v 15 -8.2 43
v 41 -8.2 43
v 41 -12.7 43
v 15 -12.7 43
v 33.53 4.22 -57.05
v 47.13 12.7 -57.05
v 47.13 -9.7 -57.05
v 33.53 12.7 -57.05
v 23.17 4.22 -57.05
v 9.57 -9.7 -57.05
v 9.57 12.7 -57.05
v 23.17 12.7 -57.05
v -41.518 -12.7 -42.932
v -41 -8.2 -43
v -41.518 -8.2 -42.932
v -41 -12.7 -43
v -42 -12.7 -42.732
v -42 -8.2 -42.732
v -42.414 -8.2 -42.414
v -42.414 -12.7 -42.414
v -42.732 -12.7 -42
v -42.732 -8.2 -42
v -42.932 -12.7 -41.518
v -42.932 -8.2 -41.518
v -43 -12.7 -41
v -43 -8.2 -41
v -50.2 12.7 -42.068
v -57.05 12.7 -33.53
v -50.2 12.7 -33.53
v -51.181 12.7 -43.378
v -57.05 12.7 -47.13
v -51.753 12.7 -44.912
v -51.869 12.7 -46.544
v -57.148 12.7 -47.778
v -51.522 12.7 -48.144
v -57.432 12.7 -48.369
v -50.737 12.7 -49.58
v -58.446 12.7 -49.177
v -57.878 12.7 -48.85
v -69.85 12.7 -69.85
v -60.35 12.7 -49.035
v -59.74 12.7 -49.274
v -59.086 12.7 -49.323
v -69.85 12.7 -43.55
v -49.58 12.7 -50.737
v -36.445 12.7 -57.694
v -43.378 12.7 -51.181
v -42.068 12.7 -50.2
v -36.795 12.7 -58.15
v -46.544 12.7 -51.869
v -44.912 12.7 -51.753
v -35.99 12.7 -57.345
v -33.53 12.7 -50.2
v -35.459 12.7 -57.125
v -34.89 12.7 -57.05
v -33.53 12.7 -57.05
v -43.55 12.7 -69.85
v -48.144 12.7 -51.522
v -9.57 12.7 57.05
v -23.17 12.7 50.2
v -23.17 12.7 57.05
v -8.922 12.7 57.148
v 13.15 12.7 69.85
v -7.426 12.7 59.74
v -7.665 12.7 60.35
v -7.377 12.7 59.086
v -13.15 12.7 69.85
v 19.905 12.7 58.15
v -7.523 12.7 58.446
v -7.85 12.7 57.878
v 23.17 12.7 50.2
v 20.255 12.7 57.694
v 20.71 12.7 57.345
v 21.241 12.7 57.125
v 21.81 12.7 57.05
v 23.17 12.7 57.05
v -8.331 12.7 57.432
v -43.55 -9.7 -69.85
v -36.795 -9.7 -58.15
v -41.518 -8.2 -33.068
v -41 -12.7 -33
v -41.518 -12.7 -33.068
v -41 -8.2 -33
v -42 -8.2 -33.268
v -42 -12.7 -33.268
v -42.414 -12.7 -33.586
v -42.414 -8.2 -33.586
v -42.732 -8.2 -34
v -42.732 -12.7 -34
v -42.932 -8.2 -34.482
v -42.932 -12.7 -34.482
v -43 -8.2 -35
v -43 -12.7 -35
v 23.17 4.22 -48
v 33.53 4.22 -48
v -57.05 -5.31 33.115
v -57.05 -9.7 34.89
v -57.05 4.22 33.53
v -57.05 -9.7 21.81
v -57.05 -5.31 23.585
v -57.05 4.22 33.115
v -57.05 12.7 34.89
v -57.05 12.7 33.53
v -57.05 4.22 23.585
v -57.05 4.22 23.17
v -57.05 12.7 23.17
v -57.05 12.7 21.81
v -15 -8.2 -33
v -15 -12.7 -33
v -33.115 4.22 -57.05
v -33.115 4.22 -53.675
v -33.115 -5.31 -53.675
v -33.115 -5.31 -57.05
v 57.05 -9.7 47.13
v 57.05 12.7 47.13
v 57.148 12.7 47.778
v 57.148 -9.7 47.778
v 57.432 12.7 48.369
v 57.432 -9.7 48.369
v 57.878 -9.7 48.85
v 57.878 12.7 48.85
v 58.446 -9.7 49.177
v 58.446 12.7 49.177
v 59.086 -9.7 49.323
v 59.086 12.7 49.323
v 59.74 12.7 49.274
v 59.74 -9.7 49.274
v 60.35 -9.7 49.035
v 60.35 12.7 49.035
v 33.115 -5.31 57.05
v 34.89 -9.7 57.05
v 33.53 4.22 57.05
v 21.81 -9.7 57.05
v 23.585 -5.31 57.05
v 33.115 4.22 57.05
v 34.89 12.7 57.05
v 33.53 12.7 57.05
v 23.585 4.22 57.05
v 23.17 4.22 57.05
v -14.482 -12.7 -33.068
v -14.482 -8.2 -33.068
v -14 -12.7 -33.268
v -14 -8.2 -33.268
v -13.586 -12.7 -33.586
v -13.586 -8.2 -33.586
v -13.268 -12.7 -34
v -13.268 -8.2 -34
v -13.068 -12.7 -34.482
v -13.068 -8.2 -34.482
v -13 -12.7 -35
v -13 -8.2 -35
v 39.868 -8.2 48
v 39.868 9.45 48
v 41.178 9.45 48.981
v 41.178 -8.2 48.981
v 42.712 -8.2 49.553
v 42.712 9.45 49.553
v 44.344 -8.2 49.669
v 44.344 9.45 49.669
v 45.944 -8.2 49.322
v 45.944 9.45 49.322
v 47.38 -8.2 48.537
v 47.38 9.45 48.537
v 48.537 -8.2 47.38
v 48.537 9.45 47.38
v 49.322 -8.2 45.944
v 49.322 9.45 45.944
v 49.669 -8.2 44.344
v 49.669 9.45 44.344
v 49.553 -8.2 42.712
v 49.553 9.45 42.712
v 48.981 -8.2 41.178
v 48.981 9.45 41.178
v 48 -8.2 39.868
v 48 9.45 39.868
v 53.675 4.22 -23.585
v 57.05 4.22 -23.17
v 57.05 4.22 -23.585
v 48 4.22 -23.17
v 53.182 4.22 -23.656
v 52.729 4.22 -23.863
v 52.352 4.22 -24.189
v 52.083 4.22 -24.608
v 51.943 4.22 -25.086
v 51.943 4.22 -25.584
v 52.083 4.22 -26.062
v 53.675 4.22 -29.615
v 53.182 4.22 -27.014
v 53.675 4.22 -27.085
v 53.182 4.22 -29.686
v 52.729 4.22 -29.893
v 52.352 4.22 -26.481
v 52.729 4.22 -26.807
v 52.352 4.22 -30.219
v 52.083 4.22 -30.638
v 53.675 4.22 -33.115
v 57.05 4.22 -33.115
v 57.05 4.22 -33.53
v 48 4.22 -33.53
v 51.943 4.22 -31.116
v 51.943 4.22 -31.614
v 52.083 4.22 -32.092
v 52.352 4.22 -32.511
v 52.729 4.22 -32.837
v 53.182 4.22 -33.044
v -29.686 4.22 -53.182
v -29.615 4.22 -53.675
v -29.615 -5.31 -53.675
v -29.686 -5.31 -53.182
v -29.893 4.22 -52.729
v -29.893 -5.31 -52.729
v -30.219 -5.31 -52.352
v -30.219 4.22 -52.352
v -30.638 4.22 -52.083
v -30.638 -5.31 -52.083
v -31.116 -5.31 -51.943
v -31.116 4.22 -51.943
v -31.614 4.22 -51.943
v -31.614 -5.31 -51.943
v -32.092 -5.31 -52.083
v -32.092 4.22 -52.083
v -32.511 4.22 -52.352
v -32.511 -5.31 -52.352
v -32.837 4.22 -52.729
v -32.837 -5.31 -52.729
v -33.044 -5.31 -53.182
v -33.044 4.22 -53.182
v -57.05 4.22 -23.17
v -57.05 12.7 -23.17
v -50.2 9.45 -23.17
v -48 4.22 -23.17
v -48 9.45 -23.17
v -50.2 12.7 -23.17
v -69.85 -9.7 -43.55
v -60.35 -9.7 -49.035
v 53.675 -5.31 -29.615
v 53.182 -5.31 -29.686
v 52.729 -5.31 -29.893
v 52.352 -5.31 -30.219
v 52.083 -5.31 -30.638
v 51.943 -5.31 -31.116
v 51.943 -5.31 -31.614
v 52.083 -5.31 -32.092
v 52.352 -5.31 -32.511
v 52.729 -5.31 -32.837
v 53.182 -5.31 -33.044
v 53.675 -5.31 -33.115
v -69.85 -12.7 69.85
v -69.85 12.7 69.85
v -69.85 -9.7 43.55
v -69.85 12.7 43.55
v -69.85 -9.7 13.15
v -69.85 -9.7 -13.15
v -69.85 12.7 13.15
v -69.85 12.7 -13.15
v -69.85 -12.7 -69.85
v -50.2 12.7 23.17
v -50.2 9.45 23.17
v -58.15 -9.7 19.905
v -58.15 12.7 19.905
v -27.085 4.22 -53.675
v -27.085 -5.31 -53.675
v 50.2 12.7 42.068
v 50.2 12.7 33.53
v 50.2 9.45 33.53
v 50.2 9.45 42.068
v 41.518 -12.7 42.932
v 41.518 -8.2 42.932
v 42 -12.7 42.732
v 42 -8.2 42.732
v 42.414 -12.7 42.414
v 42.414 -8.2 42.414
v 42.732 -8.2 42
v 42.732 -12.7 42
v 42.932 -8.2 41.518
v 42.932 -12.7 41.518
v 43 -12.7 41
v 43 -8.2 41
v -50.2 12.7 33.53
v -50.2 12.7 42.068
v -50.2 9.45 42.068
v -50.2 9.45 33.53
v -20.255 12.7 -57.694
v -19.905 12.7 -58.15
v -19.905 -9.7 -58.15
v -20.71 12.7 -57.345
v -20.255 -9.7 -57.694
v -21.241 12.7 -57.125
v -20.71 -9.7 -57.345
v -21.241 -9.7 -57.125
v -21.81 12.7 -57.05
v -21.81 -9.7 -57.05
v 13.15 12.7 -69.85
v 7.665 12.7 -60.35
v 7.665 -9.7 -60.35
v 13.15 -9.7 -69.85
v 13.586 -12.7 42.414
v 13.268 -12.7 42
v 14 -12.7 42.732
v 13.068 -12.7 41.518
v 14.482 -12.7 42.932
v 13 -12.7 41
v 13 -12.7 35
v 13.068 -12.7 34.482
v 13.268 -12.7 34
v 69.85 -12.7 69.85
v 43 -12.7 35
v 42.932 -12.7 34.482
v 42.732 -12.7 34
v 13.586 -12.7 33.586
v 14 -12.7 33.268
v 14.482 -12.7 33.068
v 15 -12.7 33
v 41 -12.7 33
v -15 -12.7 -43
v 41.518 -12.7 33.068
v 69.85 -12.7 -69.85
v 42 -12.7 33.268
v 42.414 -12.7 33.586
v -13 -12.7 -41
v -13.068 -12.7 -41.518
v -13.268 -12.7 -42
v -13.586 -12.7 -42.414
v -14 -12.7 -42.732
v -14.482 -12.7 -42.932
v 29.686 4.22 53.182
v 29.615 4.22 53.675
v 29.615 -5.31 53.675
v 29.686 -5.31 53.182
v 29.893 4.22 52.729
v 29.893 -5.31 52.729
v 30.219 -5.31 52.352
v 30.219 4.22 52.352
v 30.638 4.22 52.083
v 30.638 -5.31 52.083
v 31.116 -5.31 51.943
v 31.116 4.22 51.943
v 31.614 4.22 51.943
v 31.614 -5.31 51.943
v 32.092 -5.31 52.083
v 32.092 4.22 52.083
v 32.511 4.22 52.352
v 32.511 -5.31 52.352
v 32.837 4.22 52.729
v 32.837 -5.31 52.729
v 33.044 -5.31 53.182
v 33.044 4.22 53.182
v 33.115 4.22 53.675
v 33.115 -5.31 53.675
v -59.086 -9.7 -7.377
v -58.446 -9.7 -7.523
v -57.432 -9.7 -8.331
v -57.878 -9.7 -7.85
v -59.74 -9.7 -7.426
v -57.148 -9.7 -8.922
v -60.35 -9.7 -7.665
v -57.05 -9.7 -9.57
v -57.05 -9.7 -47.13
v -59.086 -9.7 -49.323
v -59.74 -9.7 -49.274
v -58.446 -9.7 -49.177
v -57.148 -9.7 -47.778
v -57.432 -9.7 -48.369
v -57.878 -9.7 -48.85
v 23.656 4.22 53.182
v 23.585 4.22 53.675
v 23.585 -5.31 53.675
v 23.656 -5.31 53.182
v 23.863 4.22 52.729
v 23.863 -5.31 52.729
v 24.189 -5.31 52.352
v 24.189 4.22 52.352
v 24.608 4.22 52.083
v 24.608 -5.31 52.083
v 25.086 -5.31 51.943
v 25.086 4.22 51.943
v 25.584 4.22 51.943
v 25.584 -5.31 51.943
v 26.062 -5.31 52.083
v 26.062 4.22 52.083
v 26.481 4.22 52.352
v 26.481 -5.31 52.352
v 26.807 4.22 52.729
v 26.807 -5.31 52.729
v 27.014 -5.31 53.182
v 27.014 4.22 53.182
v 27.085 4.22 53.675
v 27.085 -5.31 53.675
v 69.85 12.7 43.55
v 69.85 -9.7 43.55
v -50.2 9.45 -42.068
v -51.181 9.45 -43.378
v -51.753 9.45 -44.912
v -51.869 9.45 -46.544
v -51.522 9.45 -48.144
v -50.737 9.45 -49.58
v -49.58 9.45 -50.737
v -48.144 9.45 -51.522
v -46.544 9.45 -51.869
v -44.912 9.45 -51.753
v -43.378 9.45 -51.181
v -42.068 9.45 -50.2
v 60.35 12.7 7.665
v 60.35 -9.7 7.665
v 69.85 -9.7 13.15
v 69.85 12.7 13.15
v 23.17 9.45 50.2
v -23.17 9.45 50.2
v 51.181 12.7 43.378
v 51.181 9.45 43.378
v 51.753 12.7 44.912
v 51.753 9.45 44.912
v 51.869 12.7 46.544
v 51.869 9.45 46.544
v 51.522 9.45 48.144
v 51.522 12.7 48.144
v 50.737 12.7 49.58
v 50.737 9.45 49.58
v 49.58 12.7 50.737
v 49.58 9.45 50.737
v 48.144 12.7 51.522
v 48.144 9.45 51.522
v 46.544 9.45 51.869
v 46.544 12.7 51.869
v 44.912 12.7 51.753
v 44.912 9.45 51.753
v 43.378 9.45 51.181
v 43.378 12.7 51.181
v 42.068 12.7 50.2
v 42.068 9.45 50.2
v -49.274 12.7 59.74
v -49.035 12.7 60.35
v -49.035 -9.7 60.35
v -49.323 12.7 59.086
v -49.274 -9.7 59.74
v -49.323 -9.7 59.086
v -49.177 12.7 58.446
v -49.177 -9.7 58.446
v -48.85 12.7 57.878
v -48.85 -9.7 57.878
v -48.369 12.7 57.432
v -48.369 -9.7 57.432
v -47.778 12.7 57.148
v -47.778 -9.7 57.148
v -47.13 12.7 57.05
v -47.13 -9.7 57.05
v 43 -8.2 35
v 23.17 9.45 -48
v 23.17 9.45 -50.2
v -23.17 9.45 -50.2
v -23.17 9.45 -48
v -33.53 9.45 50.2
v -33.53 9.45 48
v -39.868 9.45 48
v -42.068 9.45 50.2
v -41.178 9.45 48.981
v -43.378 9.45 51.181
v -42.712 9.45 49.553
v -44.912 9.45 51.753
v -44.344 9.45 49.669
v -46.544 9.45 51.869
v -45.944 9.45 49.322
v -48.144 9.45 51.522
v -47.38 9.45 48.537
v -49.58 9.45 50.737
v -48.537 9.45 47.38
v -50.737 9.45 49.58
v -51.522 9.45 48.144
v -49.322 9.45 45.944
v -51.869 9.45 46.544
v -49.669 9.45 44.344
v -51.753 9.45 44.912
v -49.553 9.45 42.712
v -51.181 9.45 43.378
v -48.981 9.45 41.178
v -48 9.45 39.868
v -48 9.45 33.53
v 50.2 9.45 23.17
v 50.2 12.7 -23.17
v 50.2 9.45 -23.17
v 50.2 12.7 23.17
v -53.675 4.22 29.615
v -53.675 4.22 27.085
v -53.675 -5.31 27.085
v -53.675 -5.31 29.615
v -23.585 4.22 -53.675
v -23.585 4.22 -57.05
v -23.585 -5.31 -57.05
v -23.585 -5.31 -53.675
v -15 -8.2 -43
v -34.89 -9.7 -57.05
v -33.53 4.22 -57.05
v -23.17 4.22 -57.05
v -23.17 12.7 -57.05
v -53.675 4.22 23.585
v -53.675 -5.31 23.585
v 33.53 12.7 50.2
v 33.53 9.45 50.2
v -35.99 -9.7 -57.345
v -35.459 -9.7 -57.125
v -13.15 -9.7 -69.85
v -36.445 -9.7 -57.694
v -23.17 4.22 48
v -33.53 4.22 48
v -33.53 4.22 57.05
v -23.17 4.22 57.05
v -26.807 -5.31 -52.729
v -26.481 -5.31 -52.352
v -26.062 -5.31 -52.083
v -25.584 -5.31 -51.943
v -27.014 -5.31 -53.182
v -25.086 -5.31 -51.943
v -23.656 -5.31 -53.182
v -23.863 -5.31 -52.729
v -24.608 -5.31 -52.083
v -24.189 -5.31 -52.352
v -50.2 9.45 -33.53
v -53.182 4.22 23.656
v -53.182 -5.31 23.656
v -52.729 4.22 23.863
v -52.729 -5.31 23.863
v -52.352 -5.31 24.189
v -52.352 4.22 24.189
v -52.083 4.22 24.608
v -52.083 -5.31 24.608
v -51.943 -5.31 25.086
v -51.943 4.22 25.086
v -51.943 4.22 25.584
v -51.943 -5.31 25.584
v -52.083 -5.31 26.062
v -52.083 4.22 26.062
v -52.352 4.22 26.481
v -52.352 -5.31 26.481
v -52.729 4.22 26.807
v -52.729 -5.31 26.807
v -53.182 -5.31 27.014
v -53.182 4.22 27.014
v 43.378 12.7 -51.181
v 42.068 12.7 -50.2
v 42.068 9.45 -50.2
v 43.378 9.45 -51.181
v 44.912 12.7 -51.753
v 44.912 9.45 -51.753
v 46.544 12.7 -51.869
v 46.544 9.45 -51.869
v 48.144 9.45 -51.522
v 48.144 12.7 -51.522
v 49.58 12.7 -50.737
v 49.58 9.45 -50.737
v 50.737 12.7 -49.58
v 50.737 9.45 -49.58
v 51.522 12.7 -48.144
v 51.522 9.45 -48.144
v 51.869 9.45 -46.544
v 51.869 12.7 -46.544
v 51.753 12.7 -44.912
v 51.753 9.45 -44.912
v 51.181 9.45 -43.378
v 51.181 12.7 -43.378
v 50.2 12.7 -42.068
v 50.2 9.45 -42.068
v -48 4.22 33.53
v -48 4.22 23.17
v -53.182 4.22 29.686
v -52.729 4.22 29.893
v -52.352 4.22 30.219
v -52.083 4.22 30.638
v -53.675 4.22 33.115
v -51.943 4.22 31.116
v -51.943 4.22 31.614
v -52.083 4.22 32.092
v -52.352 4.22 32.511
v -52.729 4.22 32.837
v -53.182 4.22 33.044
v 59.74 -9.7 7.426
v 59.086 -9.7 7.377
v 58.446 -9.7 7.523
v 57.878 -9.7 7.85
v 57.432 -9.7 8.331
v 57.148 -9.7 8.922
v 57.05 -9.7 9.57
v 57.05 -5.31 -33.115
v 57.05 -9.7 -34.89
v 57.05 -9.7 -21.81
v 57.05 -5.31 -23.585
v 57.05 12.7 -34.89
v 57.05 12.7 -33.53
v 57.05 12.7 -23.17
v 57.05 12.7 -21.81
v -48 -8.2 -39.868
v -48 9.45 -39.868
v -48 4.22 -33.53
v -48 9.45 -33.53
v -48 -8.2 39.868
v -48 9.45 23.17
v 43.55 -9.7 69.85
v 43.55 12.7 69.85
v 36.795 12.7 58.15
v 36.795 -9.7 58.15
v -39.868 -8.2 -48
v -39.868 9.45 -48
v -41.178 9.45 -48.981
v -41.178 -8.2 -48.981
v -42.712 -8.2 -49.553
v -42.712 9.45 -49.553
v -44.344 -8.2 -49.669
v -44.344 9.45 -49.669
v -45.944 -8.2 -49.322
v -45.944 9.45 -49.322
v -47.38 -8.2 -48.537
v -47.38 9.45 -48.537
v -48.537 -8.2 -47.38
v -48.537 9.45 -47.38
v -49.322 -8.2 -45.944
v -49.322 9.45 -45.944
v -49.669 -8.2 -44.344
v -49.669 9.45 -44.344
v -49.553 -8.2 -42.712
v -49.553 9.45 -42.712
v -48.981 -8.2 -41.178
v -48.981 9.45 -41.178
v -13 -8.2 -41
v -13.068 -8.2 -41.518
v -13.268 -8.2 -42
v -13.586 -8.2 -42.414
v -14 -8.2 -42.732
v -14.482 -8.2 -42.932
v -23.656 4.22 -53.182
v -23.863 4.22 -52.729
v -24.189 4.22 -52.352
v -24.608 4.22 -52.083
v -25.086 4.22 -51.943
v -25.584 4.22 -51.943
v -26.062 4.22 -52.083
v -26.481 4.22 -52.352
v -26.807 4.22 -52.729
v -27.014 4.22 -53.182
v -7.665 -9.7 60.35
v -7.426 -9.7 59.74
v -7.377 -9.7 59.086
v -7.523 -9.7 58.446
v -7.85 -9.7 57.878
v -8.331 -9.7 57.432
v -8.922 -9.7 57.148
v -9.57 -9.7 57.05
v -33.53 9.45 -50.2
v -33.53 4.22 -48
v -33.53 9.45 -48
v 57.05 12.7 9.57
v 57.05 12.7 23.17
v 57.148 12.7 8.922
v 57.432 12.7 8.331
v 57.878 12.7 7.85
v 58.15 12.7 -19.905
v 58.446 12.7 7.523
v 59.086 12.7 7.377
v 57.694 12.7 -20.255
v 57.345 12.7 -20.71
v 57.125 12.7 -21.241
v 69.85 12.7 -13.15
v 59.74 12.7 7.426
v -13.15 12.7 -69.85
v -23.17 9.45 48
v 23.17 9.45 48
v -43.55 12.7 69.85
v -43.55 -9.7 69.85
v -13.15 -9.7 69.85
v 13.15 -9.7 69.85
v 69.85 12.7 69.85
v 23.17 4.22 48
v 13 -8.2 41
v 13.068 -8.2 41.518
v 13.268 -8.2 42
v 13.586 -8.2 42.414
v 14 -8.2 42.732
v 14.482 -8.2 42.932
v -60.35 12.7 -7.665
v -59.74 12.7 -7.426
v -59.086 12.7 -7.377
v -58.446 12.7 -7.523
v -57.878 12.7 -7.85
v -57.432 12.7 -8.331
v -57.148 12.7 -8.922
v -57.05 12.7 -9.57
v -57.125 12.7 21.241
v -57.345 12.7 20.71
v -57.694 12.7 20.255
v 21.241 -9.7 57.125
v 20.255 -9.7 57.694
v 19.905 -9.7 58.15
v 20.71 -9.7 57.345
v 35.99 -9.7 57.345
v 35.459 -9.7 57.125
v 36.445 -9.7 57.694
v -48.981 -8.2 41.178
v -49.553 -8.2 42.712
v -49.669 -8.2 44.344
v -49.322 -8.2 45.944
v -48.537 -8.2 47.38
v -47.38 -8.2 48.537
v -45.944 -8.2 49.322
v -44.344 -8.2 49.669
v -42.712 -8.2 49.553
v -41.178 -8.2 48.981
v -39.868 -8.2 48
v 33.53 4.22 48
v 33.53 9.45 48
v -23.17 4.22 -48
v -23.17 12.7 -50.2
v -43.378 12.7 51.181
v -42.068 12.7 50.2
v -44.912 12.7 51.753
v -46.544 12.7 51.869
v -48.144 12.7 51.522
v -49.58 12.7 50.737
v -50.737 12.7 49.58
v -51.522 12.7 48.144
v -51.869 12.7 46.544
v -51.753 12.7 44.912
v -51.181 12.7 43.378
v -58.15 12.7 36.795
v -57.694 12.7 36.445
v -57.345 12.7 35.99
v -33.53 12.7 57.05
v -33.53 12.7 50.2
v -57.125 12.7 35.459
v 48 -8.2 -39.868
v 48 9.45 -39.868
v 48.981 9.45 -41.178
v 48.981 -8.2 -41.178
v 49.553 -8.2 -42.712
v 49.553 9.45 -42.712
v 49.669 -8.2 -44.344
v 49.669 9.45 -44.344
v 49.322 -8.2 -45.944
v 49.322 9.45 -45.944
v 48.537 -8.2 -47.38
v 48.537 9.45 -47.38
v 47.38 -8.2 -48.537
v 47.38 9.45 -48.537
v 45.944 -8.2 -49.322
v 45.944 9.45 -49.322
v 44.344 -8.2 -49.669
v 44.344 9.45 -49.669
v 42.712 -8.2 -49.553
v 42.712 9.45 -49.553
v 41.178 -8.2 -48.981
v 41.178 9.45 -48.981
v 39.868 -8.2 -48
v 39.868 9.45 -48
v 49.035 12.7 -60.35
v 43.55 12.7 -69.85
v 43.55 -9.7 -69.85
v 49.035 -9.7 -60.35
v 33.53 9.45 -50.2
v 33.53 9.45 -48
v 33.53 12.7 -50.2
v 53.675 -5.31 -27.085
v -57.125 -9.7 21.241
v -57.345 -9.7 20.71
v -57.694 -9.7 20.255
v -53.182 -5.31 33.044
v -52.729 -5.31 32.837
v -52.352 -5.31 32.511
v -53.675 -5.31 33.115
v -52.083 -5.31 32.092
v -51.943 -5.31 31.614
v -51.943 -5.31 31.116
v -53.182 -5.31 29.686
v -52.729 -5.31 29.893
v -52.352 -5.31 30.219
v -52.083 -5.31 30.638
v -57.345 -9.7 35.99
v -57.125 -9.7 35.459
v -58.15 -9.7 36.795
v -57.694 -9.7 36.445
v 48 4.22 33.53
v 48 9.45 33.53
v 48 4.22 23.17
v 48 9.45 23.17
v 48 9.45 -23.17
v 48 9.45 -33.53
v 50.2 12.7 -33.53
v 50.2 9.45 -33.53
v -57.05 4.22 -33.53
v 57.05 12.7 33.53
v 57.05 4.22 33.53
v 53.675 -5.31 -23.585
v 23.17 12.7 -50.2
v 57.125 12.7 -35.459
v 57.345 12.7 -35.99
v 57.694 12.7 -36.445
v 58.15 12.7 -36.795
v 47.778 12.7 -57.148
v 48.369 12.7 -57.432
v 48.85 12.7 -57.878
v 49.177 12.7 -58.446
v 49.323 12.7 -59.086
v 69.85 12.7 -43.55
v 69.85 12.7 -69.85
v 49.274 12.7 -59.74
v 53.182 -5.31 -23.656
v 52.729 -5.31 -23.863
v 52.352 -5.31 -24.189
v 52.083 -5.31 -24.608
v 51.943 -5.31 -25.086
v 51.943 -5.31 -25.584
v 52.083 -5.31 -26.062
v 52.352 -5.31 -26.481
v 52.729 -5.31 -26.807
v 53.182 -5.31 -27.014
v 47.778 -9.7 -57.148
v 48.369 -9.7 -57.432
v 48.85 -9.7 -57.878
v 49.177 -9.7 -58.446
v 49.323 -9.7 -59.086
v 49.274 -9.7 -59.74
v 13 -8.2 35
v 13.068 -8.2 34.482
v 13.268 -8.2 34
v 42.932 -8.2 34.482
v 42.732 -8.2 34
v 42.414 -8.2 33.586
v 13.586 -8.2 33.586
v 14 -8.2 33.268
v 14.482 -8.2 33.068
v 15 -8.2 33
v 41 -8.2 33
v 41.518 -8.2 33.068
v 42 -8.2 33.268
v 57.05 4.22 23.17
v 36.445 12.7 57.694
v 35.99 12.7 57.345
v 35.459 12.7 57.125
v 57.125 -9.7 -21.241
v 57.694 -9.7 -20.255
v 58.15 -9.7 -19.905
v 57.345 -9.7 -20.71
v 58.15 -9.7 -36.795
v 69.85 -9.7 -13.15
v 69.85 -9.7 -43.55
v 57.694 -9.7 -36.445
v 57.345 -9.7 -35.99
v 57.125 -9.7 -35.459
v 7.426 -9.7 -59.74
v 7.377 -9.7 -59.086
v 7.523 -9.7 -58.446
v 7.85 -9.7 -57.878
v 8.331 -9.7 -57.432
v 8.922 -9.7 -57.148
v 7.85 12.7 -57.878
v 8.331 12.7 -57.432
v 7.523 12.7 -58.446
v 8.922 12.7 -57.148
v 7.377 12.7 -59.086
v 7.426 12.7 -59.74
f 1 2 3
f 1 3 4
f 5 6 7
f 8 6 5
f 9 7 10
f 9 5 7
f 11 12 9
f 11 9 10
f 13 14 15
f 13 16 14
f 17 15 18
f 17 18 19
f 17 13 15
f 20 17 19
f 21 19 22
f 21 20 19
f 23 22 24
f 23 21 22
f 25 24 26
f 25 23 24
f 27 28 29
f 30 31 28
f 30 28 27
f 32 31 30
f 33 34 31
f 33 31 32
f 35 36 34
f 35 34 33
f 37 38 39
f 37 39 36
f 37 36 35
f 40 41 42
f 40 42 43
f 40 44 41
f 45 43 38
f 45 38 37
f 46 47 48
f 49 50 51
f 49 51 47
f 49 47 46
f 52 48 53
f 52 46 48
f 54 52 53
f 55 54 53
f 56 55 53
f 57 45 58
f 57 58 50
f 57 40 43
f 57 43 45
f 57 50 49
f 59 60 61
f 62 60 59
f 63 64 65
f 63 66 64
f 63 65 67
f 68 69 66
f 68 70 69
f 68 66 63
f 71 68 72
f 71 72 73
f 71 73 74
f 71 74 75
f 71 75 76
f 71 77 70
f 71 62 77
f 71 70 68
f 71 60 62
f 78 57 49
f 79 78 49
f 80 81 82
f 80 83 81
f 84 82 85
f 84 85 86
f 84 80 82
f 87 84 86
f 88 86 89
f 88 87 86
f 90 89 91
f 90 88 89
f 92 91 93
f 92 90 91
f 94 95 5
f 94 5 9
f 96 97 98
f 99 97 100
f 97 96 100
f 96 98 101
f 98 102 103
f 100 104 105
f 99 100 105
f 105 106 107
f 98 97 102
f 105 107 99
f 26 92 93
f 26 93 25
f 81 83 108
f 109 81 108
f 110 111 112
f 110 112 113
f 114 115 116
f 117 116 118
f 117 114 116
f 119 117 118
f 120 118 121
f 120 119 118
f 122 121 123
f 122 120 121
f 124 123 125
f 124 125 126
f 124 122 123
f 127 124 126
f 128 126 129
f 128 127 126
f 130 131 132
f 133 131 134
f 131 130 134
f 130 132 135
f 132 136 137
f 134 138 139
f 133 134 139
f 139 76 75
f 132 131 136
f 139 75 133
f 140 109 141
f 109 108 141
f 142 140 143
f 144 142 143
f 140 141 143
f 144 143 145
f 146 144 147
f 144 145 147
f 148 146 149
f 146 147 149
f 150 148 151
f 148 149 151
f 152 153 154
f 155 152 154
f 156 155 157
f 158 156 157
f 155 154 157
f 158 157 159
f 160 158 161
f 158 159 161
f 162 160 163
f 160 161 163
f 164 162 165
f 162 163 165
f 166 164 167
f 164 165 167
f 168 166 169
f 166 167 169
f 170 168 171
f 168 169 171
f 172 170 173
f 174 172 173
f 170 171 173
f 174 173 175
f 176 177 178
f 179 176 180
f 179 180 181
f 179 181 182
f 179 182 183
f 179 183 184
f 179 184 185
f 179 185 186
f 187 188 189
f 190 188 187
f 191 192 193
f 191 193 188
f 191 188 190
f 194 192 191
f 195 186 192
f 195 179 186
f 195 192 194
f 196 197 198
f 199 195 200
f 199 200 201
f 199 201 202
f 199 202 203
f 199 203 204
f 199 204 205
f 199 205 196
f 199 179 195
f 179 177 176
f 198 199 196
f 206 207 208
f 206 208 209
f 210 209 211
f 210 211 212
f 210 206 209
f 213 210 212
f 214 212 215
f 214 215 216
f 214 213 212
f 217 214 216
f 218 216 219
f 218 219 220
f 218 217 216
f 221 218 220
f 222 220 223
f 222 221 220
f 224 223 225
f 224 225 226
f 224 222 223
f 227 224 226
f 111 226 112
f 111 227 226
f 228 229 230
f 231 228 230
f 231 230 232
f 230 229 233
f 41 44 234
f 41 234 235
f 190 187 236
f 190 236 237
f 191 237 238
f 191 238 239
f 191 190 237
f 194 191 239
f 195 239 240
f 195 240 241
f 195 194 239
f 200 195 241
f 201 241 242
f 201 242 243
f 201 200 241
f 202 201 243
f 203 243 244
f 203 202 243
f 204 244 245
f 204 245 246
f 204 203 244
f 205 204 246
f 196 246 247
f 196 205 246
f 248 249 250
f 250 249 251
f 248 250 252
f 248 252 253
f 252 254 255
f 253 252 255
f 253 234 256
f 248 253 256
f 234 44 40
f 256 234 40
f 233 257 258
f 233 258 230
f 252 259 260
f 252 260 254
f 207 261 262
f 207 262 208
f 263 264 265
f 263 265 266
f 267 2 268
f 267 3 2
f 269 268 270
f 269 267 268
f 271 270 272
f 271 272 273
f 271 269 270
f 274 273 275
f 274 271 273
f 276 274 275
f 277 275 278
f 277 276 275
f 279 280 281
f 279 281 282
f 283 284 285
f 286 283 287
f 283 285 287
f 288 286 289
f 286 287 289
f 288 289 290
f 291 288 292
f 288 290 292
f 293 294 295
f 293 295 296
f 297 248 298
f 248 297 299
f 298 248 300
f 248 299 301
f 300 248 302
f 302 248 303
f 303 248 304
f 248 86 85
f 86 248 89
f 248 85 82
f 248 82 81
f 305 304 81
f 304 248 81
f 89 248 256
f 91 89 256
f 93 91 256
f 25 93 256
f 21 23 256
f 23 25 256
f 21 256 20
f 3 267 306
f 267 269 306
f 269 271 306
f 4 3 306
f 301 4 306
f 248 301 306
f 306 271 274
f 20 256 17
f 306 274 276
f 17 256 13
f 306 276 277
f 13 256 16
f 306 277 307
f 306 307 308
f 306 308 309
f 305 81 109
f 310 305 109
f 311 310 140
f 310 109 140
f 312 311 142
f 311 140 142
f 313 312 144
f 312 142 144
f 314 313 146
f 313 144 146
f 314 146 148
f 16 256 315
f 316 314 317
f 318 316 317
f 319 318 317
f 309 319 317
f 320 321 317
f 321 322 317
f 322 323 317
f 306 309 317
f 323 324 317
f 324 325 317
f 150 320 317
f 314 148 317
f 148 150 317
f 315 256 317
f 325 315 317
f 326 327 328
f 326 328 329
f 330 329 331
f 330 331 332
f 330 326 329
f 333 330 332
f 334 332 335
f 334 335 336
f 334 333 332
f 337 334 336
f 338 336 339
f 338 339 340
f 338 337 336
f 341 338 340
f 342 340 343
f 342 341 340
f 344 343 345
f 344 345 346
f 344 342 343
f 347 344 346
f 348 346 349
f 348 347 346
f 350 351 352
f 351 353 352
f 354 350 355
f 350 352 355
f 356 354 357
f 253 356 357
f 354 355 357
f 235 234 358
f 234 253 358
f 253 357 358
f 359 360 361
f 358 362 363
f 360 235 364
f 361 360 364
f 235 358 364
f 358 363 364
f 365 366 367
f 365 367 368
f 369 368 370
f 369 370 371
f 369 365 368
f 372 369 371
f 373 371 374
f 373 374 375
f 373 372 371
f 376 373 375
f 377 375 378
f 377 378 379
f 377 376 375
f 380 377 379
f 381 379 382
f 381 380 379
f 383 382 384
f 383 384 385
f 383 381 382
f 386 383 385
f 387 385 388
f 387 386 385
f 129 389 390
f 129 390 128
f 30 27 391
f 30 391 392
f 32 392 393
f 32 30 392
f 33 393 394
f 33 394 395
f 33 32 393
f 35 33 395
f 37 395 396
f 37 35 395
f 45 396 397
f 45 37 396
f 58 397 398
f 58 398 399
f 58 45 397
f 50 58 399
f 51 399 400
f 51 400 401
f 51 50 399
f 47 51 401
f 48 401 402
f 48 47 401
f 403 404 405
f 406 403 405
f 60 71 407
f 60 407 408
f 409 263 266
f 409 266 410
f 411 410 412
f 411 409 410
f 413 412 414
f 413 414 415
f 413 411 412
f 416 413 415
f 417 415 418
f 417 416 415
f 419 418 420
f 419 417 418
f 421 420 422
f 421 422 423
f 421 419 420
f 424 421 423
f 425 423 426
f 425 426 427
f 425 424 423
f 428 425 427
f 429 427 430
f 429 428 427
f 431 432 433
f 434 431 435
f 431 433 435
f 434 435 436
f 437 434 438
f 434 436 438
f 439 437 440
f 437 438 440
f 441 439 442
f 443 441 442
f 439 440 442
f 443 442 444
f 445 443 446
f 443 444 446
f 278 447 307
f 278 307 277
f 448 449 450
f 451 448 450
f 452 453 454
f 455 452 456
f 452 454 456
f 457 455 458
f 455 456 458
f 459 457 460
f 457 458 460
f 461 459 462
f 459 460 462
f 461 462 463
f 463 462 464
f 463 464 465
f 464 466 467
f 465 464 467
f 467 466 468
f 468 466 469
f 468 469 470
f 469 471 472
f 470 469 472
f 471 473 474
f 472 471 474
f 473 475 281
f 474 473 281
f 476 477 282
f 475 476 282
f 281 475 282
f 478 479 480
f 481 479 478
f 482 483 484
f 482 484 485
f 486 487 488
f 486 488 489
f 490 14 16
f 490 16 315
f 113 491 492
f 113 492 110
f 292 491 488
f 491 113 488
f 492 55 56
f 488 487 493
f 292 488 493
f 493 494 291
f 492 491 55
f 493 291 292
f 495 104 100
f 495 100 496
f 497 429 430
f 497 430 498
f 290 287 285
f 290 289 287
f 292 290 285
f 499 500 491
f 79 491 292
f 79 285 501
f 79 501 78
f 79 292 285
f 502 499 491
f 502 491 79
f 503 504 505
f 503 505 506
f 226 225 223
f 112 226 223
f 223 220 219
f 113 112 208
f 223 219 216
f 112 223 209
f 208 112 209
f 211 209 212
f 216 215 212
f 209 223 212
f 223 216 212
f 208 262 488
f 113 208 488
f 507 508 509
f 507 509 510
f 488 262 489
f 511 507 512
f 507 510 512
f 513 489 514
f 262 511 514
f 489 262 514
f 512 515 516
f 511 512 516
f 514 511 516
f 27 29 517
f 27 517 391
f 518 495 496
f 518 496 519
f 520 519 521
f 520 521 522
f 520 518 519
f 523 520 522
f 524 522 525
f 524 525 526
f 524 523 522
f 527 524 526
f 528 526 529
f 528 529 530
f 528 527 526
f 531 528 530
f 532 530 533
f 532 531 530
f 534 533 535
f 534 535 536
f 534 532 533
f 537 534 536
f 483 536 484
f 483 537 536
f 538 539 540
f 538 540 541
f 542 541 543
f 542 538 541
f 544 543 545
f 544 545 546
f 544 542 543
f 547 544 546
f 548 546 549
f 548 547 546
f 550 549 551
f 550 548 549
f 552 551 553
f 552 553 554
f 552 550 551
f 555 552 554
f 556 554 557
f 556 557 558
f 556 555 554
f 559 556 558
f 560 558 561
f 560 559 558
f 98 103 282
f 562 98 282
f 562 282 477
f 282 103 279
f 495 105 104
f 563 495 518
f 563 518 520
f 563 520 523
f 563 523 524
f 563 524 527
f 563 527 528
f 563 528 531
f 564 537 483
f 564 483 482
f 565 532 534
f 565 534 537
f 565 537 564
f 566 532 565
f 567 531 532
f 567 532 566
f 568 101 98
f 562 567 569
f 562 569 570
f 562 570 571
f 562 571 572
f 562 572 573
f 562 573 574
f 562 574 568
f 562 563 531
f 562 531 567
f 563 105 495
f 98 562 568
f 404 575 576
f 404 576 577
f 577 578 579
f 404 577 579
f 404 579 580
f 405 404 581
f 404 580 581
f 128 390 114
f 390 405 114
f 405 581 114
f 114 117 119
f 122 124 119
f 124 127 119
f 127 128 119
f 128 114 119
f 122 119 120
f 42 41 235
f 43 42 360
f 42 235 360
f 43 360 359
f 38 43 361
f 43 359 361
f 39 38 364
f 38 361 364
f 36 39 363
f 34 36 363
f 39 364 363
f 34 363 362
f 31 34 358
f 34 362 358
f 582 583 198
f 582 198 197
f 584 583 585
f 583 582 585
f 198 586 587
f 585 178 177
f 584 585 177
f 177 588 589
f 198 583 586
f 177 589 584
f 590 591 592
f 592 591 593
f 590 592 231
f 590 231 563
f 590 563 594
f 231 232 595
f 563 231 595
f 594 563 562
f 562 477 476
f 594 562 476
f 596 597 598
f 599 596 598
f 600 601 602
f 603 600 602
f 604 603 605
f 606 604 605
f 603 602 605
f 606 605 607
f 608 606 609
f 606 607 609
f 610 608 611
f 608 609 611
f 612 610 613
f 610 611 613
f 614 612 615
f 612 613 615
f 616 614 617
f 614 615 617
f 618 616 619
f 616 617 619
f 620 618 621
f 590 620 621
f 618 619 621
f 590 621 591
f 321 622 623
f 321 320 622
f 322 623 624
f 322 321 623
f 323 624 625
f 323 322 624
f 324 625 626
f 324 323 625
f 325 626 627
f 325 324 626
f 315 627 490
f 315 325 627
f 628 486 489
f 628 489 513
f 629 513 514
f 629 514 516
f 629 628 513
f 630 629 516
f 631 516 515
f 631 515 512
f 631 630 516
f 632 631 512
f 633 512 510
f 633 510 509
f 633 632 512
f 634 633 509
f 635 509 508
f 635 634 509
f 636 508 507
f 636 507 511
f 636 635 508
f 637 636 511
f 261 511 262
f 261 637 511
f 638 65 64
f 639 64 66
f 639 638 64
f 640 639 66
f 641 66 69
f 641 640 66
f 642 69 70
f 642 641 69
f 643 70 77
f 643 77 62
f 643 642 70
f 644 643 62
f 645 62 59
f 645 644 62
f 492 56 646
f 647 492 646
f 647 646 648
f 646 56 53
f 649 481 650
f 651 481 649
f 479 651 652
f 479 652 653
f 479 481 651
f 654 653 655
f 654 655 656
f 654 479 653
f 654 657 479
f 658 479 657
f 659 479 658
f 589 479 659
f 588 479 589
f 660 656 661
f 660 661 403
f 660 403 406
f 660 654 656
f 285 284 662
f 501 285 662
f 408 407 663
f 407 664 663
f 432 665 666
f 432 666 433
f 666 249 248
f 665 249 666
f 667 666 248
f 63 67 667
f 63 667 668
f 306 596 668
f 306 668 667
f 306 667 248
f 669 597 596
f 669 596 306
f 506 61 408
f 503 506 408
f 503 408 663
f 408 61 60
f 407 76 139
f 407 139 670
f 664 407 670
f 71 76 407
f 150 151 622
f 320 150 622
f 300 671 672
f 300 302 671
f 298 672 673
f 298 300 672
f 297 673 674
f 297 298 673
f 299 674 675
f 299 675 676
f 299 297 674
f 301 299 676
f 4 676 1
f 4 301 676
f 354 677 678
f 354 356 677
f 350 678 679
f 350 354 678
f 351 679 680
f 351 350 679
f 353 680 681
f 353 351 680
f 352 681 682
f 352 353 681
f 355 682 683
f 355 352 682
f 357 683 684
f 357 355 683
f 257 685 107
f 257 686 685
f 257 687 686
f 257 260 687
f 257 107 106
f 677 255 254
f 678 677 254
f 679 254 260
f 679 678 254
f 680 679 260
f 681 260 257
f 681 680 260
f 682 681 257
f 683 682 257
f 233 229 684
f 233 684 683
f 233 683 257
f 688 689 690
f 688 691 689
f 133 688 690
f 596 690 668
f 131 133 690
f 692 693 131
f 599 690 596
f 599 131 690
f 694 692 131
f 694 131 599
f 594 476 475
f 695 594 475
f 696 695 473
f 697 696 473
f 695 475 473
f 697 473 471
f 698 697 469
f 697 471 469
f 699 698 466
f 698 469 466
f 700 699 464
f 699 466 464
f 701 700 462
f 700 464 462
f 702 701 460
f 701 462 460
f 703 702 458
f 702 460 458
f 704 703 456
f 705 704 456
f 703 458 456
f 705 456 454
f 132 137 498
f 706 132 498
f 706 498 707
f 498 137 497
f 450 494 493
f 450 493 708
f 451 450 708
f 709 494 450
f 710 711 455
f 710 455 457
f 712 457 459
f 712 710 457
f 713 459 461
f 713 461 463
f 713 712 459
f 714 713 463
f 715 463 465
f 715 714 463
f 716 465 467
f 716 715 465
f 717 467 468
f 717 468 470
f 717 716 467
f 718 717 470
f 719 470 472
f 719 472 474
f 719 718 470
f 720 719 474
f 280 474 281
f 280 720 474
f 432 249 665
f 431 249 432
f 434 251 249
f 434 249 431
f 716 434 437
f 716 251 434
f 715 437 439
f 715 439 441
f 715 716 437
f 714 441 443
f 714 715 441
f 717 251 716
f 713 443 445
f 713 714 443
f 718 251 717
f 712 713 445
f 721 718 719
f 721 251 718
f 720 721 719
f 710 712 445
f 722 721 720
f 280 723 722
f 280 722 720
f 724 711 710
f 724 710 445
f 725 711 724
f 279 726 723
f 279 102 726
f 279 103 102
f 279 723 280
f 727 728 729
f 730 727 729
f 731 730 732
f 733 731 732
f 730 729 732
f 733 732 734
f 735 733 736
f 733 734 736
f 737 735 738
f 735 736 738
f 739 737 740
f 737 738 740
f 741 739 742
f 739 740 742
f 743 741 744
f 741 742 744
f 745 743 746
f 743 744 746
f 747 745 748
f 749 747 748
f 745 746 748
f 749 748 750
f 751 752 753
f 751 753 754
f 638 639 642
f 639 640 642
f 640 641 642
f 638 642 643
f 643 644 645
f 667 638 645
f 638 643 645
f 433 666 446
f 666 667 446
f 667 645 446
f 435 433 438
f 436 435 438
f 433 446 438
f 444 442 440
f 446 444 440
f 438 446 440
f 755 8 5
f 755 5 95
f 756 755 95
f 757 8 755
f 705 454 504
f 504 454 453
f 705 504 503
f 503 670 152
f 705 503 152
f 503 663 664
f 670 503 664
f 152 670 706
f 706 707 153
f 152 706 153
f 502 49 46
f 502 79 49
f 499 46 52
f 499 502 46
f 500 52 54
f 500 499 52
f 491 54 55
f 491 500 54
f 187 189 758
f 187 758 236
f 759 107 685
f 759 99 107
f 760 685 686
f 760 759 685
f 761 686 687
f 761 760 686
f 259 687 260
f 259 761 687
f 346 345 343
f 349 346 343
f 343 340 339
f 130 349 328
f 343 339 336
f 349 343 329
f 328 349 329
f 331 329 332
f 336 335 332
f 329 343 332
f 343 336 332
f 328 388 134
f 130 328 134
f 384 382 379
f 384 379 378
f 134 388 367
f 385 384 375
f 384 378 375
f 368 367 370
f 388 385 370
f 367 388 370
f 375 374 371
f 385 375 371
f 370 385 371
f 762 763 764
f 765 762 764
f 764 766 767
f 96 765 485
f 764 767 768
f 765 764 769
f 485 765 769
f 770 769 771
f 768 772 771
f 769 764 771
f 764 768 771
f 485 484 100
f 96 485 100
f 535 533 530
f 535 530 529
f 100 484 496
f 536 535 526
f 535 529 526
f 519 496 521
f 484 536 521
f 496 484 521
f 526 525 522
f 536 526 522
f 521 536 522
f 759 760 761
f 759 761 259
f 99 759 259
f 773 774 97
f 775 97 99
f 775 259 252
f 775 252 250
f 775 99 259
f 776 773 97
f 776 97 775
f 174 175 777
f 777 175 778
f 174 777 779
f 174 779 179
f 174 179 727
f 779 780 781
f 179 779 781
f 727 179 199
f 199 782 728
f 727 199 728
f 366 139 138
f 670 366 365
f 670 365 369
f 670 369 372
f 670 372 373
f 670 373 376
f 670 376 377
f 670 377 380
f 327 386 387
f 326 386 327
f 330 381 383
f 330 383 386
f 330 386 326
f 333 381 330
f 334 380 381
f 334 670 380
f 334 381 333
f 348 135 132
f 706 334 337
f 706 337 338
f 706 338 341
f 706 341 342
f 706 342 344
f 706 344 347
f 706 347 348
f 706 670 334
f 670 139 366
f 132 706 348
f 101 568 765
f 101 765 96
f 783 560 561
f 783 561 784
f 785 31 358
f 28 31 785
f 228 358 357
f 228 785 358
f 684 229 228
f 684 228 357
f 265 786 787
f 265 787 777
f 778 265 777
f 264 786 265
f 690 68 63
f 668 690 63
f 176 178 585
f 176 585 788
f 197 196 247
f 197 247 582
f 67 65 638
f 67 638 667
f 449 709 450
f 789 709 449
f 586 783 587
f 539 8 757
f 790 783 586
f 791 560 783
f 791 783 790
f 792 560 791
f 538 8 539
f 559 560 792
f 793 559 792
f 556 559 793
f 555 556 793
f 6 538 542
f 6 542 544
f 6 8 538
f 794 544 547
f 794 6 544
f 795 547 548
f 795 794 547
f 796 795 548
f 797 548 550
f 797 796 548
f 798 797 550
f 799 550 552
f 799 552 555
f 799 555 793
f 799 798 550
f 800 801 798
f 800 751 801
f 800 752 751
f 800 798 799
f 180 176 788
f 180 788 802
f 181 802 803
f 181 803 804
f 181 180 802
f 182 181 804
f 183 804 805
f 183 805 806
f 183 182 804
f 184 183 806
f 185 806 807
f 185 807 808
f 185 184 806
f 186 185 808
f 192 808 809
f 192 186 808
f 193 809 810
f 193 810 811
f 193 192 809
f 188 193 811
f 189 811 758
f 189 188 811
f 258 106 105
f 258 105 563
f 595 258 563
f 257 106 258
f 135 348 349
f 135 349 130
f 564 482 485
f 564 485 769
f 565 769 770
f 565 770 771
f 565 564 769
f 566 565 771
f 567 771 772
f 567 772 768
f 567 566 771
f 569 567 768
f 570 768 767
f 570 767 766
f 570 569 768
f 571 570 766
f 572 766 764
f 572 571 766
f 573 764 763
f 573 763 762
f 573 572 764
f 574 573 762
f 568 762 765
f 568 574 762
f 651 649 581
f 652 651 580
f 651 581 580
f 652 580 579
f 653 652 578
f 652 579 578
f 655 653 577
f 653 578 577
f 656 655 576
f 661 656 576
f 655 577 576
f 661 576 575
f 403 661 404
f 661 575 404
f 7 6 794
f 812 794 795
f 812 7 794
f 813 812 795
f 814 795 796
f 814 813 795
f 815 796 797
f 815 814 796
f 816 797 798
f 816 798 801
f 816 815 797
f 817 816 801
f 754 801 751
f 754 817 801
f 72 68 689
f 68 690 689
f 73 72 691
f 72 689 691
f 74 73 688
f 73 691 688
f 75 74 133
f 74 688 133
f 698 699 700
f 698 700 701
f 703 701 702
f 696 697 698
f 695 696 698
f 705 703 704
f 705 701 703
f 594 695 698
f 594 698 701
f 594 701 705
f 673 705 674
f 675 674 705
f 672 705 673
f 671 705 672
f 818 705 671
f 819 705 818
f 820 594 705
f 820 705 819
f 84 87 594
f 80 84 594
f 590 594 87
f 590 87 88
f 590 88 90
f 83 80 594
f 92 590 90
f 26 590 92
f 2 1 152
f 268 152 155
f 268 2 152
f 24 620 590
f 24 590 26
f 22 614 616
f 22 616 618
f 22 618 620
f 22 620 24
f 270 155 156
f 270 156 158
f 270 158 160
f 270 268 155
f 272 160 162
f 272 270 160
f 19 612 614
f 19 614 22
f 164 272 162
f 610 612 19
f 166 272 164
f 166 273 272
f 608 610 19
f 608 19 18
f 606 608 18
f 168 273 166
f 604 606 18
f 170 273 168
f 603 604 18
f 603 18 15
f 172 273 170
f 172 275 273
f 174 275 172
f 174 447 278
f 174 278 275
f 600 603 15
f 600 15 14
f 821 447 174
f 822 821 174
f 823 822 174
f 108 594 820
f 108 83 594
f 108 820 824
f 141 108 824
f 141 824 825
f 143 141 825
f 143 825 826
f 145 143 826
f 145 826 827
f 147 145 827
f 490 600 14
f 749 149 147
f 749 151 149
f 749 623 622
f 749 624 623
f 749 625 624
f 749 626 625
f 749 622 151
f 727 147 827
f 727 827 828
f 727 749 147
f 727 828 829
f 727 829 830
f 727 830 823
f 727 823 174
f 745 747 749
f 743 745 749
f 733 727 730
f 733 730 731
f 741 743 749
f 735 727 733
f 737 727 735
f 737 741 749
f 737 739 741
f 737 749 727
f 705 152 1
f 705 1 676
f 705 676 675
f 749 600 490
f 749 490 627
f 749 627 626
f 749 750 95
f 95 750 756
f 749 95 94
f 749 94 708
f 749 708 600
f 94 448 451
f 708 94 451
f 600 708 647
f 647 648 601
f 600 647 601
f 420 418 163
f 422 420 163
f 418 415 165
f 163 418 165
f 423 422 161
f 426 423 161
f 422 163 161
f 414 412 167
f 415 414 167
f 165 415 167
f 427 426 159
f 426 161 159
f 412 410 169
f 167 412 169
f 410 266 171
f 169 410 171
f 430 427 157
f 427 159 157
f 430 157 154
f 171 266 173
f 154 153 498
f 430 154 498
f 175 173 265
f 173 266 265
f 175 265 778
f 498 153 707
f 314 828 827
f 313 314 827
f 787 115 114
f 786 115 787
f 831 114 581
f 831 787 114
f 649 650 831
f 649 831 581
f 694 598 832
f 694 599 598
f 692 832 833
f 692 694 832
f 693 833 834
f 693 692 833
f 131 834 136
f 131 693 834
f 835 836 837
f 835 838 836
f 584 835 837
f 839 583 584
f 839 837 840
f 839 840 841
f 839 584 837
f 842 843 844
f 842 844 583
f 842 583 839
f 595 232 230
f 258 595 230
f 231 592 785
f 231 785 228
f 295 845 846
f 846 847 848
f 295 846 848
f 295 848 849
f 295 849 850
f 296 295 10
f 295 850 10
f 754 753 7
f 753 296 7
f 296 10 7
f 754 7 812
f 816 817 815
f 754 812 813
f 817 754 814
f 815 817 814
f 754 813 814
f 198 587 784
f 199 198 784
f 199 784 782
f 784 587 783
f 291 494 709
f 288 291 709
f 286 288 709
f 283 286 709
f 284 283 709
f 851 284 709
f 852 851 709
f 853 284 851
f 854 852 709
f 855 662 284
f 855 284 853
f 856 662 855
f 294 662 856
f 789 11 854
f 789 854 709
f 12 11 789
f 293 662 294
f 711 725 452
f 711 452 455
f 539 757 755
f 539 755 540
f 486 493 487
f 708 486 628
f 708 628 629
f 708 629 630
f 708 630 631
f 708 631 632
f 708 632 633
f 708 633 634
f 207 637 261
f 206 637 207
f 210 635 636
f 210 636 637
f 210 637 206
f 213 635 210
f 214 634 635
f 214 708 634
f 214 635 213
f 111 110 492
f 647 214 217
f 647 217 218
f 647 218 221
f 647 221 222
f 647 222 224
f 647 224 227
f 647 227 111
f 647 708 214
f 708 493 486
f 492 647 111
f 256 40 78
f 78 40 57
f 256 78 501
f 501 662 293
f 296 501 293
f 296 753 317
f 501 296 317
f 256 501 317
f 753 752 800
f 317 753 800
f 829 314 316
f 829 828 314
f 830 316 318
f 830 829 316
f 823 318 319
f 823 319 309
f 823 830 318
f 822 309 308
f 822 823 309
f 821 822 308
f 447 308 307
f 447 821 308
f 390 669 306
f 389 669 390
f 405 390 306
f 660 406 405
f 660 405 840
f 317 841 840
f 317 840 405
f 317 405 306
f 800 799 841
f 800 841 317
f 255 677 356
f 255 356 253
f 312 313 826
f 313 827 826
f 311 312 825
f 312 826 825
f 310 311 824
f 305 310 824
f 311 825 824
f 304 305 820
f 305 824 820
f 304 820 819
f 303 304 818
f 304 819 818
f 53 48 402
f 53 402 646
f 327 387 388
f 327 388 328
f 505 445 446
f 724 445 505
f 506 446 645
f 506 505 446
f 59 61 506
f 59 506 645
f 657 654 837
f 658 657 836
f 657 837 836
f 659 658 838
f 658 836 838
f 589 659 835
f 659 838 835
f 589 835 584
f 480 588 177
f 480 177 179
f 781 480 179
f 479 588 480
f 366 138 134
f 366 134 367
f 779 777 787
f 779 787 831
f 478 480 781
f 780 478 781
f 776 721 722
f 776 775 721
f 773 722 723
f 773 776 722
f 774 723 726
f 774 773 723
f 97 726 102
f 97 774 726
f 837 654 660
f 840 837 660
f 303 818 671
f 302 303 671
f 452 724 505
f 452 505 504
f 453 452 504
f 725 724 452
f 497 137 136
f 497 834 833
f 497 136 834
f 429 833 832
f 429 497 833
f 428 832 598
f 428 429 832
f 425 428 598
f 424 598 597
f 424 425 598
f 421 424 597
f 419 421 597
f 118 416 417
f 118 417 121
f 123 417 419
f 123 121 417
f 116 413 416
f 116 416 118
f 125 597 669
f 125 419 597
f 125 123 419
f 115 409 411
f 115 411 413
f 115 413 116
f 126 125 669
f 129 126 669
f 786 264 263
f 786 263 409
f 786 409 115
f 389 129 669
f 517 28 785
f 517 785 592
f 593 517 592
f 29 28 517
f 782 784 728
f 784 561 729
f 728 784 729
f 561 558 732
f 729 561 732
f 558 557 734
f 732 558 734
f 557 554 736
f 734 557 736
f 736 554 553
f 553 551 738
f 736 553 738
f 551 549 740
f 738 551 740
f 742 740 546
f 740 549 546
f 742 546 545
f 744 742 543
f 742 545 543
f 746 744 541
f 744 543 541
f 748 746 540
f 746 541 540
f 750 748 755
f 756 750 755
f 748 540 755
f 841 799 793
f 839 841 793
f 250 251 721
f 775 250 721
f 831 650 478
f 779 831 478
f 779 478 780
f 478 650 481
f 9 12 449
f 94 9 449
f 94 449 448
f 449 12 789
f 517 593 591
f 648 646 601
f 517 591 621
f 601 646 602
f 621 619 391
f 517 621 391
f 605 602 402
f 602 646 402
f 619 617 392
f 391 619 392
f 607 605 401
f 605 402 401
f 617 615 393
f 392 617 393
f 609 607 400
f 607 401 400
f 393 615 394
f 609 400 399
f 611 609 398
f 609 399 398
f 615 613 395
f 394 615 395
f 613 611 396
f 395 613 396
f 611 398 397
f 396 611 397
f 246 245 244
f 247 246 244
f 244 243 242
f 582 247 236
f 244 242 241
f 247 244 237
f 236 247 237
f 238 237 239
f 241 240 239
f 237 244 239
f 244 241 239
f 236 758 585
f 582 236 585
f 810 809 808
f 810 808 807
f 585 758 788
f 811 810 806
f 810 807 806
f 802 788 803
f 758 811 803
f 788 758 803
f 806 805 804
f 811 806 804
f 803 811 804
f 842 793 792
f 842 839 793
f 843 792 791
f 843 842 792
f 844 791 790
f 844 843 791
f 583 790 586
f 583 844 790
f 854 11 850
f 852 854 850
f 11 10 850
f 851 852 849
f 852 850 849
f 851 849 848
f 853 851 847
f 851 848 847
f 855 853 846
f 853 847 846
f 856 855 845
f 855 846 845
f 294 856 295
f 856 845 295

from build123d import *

# Parameters (mm, degrees)
SKETCH1_W                          = 139.7
SKETCH1_H                          = 139.7
BOSS_EXTRUDE1_DEPTH                = 12.7
POWER_SUPPLY_COMPONENT_DEPTH_DEPTH = 20.9
CUT_EXTRUDE6_DEPTH                 = 22.4
SKETCH8_W                          = 10.36
SKETCH8_H                          = 9.05
CUT_EXTRUDE7_DEPTH                 = 8.48
CUT_EXTRUDE8_DEPTH                 = 9.53
FILLET2_R                          = 2.2
CIRPATTERN5_COUNT                  = 4
FILLET2_OF_CIRPATTERN5_R           = 2.2
CUT_EXTRUDE9_DEPTH                 = 3.25
SKETCH12_W                         = 30
SKETCH12_H                         = 10
CUT_EXTRUDE10_DEPTH                = 101.969574625
FILLET5_R                          = 2
CIRPATTERN6_COUNT                  = 2
FILLET5_OF_CIRPATTERN6_R           = 2


with BuildPart() as part:
    # Sketch1 → Boss-Extrude1 (new, symmetric)
    with BuildSketch(Plane(origin=(0, 0, 0), x_dir=(1, 0, 0), z_dir=(0, 1, 0))):
        Rectangle(SKETCH1_W, SKETCH1_H)
    extrude(amount=BOSS_EXTRUDE1_DEPTH, both=True)

    # Sketch6 → power_supply_component_depth (cut)
    with BuildSketch(Plane(origin=(0, 12.7, 0), x_dir=(1, 0, 0), z_dir=(0, 1, 0))):
        with BuildLine():
            Line((-48, 39.868272016), (-48, -39.868272016))
            ThreePointArc((-48, -39.868272016), (-48, -48), (-39.868272016, -48))
            Line((-39.868272016, -48), (39.868272016, -48))
            ThreePointArc((39.868272016, -48), (48, -48), (48, -39.868272016))
            Line((48, -39.868272016), (48, 39.868272016))
            ThreePointArc((48, 39.868272016), (48, 48), (39.868272016, 48))
            Line((39.868272016, 48), (-39.868272016, 48))
            ThreePointArc((-39.868272016, 48), (-48, 48), (-48, 39.868272016))
        make_face()
    extrude(amount=-POWER_SUPPLY_COMPONENT_DEPTH_DEPTH, mode=Mode.SUBTRACT)

    # Sketch4 → Cut-Extrude6 (cut)
    with BuildSketch(Plane(origin=(0, 12.7, 0), x_dir=(1, 0, 0), z_dir=(0, 1, 0))):
        Polygon((-43.55, -69.85), (-50.940083446, -57.05), (-5.759916554, -57.05), (-13.15, -69.85), align=None)
        Polygon((43.55, -69.85), (36.159916554, -57.05), (20.540083446, -57.05), (13.15, -69.85), align=None)
    cut_extrude6 = extrude(amount=-CUT_EXTRUDE6_DEPTH, mode=Mode.SUBTRACT)

    # Sketch8 → Cut-Extrude7 (cut)
    with BuildSketch(Plane(origin=(0, 12.7, 0), x_dir=(1, 0, 0), z_dir=(0, 1, 0))):
        with Locations((-28.35, -52.525)):
            Rectangle(SKETCH8_W, SKETCH8_H)
        with Locations((28.35, -52.525)):
            Rectangle(SKETCH8_W, SKETCH8_H)
    cut_extrude7 = extrude(amount=-CUT_EXTRUDE7_DEPTH, mode=Mode.SUBTRACT)

    # Sketch9 → Cut-Extrude8 (cut)
    with BuildSketch(Plane(origin=(0, 4.22, 0), x_dir=(1, 0, 0), z_dir=(0, 1, 0))):
        with BuildLine():
            Line((27.085, -53.675), (29.615, -53.675))
            ThreePointArc((29.615, -53.675), (31.365, -51.925), (33.115, -53.675))
            Line((33.115, -53.675), (33.115, -57.05))
            Line((33.115, -57.05), (23.585, -57.05))
            Line((23.585, -57.05), (23.585, -53.675))
            ThreePointArc((23.585, -53.675), (25.335, -51.925), (27.085, -53.675))
        make_face()
    cut_extrude8 = extrude(amount=-CUT_EXTRUDE8_DEPTH, mode=Mode.SUBTRACT)

    # Fillet2
    fillet2_edges = [part.edges().sort_by_distance(p)[0] for p in [
        (-5.759916554, 1.5, 57.05),
        (-50.940083446, 1.5, 57.05),
        (36.159916554, 1.5, 57.05),
        (20.540083446, 1.5, 57.05),
    ]]
    fillet(fillet2_edges, radius=FILLET2_R)

    # CirPattern5: Cut-Extrude6, Cut-Extrude7, Cut-Extrude8 ×4 about axis
    cirpattern5_axis = Axis((0, 0, 0), (0, 1, 0))
    add([cut_extrude6.rotate(cirpattern5_axis, i * 360 / CIRPATTERN5_COUNT) for i in range(1, CIRPATTERN5_COUNT)], mode=Mode.SUBTRACT)
    add([cut_extrude7.rotate(cirpattern5_axis, i * 360 / CIRPATTERN5_COUNT) for i in range(1, CIRPATTERN5_COUNT)], mode=Mode.SUBTRACT)
    add([cut_extrude8.rotate(cirpattern5_axis, i * 360 / CIRPATTERN5_COUNT) for i in range(1, CIRPATTERN5_COUNT)], mode=Mode.SUBTRACT)

    # Fillet2 of CirPattern5
    fillet2_of_cirpattern5_edges = [part.edges().sort_by_distance(p)[0] for p in [
        (57.05, 1.5, 5.759916554),
        (57.05, 1.5, 50.940083446),
        (57.05, 1.5, -36.159916554),
        (57.05, 1.5, -20.540083446),
        (5.759916554, 1.5, -57.05),
        (50.940083446, 1.5, -57.05),
        (-36.159916554, 1.5, -57.05),
        (-20.540083446, 1.5, -57.05),
        (-57.05, 1.5, -5.759916554),
        (-57.05, 1.5, -50.940083446),
        (-57.05, 1.5, 36.159916554),
        (-57.05, 1.5, 20.540083446),
    ]]
    fillet(fillet2_of_cirpattern5_edges, radius=FILLET2_OF_CIRPATTERN5_R)

    # Sketch10 → Cut-Extrude9 (cut)
    with BuildSketch(Plane(origin=(0, 12.7, 0), x_dir=(1, 0, 0), z_dir=(0, 1, 0))):
        with BuildLine():
            Line((-42.068272016, 50.2), (42.068272016, 50.2))
            ThreePointArc((42.068272016, 50.2), (50.2, 50.2), (50.2, 42.068272016))
            Line((50.2, 42.068272016), (50.2, -42.068272016))
            ThreePointArc((50.2, -42.068272016), (50.2, -50.2), (42.068272016, -50.2))
            Line((42.068272016, -50.2), (-42.068272016, -50.2))
            ThreePointArc((-42.068272016, -50.2), (-50.2, -50.2), (-50.2, -42.068272016))
            Line((-50.2, -42.068272016), (-50.2, 42.068272016))
            ThreePointArc((-50.2, 42.068272016), (-50.2, 50.2), (-42.068272016, 50.2))
        make_face()
    extrude(amount=-CUT_EXTRUDE9_DEPTH, mode=Mode.SUBTRACT)

    # Sketch12 → Cut-Extrude10 (cut, symmetric)
    with BuildSketch(Plane(origin=(0, -8.2, 0), x_dir=(1, 0, 0), z_dir=(0, 1, 0))):
        with Locations((-28, 38)):
            Rectangle(SKETCH12_W, SKETCH12_H)
    cut_extrude10 = extrude(amount=CUT_EXTRUDE10_DEPTH, both=True, mode=Mode.SUBTRACT)

    # Fillet5
    fillet5_edges = [part.edges().sort_by_distance(p)[0] for p in [
        (-43, -10.45, -33),
        (-43, -10.45, -43),
        (-13, -10.45, -43),
        (-13, -10.45, -33),
    ]]
    fillet(fillet5_edges, radius=FILLET5_R)

    # CirPattern6: Cut-Extrude10 ×2 about axis
    cirpattern6_axis = Axis((0, 0, 0), (0, 1, 0))
    for i in range(1, CIRPATTERN6_COUNT):
        add(cut_extrude10.rotate(cirpattern6_axis, i * 360 / CIRPATTERN6_COUNT), mode=Mode.SUBTRACT)

    # Fillet5 of CirPattern6
    fillet5_of_cirpattern6_edges = [part.edges().sort_by_distance(p)[0] for p in [
        (43, -10.45, 33),
        (43, -10.45, 43),
        (13, -10.45, 43),
        (13, -10.45, 33),
    ]]
    fillet(fillet5_of_cirpattern6_edges, radius=FILLET5_OF_CIRPATTERN6_R)


solid = part.part
